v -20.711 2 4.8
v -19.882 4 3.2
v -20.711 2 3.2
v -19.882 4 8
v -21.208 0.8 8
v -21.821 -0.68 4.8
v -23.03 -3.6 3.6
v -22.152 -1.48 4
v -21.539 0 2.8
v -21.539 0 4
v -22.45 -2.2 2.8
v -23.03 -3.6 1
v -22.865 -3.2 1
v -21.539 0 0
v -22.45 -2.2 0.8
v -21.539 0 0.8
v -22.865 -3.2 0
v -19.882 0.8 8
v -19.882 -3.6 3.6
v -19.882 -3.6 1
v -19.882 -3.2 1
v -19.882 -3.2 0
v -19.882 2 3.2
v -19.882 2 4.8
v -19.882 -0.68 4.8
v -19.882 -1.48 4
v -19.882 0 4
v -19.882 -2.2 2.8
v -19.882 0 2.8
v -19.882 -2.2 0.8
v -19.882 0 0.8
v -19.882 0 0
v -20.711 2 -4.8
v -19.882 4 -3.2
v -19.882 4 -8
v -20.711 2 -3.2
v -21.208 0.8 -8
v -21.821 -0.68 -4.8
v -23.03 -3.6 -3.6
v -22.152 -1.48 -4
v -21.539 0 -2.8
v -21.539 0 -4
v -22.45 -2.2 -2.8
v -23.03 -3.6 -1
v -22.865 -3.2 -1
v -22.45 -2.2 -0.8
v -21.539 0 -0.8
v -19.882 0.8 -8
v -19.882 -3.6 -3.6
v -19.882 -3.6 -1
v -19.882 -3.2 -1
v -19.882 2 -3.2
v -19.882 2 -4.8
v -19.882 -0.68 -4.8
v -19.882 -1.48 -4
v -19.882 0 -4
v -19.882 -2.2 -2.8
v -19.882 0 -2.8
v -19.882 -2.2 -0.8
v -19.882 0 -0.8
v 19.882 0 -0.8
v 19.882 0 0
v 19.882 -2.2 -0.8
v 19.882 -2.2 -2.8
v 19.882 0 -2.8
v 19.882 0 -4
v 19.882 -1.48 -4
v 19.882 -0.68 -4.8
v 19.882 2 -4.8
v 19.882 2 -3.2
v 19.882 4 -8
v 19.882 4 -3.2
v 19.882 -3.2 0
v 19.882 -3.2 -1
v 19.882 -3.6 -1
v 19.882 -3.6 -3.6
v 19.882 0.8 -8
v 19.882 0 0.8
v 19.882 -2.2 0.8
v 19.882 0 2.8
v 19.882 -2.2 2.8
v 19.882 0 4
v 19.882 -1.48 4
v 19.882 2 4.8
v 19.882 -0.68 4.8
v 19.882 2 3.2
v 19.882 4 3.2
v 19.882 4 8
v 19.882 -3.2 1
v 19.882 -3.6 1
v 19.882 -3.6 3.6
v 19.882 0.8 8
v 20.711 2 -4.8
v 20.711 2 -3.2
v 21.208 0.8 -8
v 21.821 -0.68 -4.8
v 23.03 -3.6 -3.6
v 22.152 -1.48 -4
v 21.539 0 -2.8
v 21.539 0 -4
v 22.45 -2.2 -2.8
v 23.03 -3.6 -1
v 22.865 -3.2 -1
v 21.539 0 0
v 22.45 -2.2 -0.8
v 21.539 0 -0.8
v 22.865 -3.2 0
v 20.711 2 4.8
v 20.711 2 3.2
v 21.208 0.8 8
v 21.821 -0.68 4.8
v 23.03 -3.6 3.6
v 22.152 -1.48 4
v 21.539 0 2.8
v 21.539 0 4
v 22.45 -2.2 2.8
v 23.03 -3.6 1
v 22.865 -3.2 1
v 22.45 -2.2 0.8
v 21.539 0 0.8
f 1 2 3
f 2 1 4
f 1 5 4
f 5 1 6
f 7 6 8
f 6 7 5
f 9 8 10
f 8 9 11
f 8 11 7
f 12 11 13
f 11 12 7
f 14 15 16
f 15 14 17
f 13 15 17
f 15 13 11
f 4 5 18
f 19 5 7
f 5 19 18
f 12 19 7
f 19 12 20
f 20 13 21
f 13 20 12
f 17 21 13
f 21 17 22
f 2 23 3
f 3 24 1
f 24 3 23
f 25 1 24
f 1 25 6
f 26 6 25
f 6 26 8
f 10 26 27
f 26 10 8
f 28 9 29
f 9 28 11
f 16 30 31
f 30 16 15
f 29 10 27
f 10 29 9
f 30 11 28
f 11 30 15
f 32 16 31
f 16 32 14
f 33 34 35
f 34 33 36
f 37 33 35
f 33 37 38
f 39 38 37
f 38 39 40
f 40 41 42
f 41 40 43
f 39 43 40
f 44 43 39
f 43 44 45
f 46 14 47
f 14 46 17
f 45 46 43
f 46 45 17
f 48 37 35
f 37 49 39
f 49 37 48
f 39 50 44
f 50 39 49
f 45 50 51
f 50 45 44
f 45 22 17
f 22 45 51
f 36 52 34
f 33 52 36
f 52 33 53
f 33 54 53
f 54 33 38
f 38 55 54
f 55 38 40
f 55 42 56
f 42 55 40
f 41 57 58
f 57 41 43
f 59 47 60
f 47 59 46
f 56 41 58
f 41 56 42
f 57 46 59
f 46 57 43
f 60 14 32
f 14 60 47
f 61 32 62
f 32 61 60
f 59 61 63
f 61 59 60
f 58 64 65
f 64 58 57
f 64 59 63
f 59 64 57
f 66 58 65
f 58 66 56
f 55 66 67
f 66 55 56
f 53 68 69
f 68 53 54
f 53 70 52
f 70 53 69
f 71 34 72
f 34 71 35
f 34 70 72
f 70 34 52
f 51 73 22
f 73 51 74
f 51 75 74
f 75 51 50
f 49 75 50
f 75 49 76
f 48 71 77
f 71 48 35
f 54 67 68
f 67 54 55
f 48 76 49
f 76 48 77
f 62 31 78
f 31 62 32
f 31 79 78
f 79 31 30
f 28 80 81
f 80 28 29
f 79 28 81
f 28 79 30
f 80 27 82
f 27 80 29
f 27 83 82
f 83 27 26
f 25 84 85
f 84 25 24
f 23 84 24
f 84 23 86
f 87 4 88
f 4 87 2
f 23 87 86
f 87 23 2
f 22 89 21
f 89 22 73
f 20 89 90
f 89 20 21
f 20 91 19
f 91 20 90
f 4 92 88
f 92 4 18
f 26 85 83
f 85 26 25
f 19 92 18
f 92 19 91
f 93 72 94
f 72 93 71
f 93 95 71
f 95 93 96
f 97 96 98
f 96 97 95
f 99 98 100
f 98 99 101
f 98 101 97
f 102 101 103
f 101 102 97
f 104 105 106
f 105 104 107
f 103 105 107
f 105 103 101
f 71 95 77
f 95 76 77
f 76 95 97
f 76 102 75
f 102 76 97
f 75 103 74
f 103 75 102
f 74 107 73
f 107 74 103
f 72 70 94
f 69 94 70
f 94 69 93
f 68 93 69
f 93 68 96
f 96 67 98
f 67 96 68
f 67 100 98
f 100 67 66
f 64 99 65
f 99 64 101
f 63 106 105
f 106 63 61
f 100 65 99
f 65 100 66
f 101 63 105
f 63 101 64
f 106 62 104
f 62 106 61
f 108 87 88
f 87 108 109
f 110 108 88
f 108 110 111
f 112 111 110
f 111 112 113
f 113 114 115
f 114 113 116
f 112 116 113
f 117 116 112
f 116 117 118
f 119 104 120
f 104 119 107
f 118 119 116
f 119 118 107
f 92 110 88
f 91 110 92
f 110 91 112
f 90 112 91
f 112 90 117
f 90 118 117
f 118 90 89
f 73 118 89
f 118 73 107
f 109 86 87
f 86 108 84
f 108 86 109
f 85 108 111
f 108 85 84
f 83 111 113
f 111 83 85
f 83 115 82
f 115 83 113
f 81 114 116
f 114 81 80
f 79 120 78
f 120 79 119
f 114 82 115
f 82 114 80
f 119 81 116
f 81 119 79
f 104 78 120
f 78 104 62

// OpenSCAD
// file: ../p/rect2p.scad
use <../lib.scad>
function ldraw_lib__rect2p() = [
// 0 Rectangle with 2 Parallel Edges
// 0 Name: rect2p.dat
// 0 Author: Donald Sutter [technog]
// 0 !LDRAW_ORG Primitive UPDATE 2010-01
// 0 !LICENSE Licensed under CC BY 2.0 and CC BY 4.0 : see CAreadme.txt
// 
// 0 BFC CERTIFY CCW
  [0,"BFC","CERTIFY"],
  [0,"BFC","CCW"],
// 
// 0 !HISTORY 2003-08-01 [PTadmin] Official Update 2003-02
// 0 !HISTORY 2007-06-24 [PTadmin] Header formatted for Contributor Agreement
// 0 !HISTORY 2008-07-01 [PTadmin] Official Update 2008-01
// 0 !HISTORY 2010-01-17 [mikeheide] changed winding to CCW
// 0 !HISTORY 2010-04-05 [PTadmin] Official Update 2010-01
// 
// 
// 2 24 1 0 1 -1 0 1
  [2,24,1,0,1,-1,0,1],
// 2 24 -1 0 -1 1 0 -1
  [2,24,-1,0,-1,1,0,-1],
// 4 16 -1 0 1 -1 0 -1 1 0 -1 1 0 1
  [4,16,-1,0,1,-1,0,-1,1,0,-1,1,0,1],
// 0
];
module ldraw_lib__rect2p(step=0, col=false, unit=2/5, alt=false, line=0.2, solid=!$preview)
    makepoly(ldraw_lib__rect2p(), step=step, col=col, unit=unit, alt=alt, line=line, solid=solid);
ldraw_lib__rect2p(line=0.2);
// file: ../p/rect1.scad
use <../lib.scad>
function ldraw_lib__rect1() = [
// 0 Rectangle with 1 Edge
// 0 Name: rect1.dat
// 0 Author: Chris Dee [cwdee]
// 0 !LDRAW_ORG Primitive UPDATE 2010-01
// 0 !LICENSE Licensed under CC BY 2.0 and CC BY 4.0 : see CAreadme.txt
// 
// 0 BFC CERTIFY CCW
  [0,"BFC","CERTIFY"],
  [0,"BFC","CCW"],
// 
// 0 !HISTORY 2003-12-19 [PTadmin] Official Update 2003-03
// 0 !HISTORY 2007-06-24 [PTadmin] Header formatted for Contributor Agreement
// 0 !HISTORY 2008-07-01 [PTadmin] Official Update 2008-01
// 0 !HISTORY 2010-01-17 [mikeheide] changed winding to CCW
// 0 !HISTORY 2010-04-05 [PTadmin] Official Update 2010-01
// 
// 
// 2 24 1 0 -1 1 0 1
  [2,24,1,0,-1,1,0,1],
// 4 16 -1 0 1 -1 0 -1 1 0 -1 1 0 1
  [4,16,-1,0,1,-1,0,-1,1,0,-1,1,0,1],
// 0
];
module ldraw_lib__rect1(step=0, col=false, unit=2/5, alt=false, line=0.2, solid=!$preview)
    makepoly(ldraw_lib__rect1(), step=step, col=col, unit=unit, alt=alt, line=line, solid=solid);
ldraw_lib__rect1(line=0.2);
// file: ../p/box2-9p.scad
use <../lib.scad>
function ldraw_lib__box2_9p() = [
// 0 Box with 2 Faces with 3 Parallel Edges
// 0 Name: box2-9p.dat
// 0 Author: Ronald Vallenduuk [Duq]
// 0 !LDRAW_ORG Primitive UPDATE 2013-02
// 0 !LICENSE Licensed under CC BY 2.0 and CC BY 4.0 : see CAreadme.txt
// 
// 0 BFC CERTIFY CCW
  [0,"BFC","CERTIFY"],
  [0,"BFC","CCW"],
// 
// 0 !HISTORY 2013-12-23 [PTadmin] Official Update 2013-02
// 
// 
// 2 24 1 1 1 -1 1 1
  [2,24,1,1,1,-1,1,1],
// 2 24 1 -1 1 -1 -1 1
  [2,24,1,-1,1,-1,-1,1],
// 2 24 1 1 -1 -1 1 -1
  [2,24,1,1,-1,-1,1,-1],
// 4 16 1 1 1 1 1 -1 -1 1 -1 -1 1 1
  [4,16,1,1,1,1,1,-1,-1,1,-1,-1,1,1],
// 4 16 1 1 1 -1 1 1 -1 -1 1 1 -1 1
  [4,16,1,1,1,-1,1,1,-1,-1,1,1,-1,1],
];
module ldraw_lib__box2_9p(step=0, col=false, unit=2/5, alt=false, line=0.2, solid=!$preview)
    makepoly(ldraw_lib__box2_9p(), step=step, col=col, unit=unit, alt=alt, line=line, solid=solid);
ldraw_lib__box2_9p(line=0.2);
// file: ../p/box2-11.scad
use <../lib.scad>
function ldraw_lib__box2_11() = [
// 0 Box with 2 Faces without 11 Edges
// 0 Name: box2-11.dat
// 0 Author: Steffen [Steffen]
// 0 !LDRAW_ORG Primitive UPDATE 2005-01
// 0 !LICENSE Licensed under CC BY 2.0 and CC BY 4.0 : see CAreadme.txt
// 
// 0 BFC CERTIFY CCW
  [0,"BFC","CERTIFY"],
  [0,"BFC","CCW"],
// 
// 0 !HISTORY 2005-12-28 [PTadmin] Official Update 2005-01
// 0 !HISTORY 2007-06-24 [PTadmin] Header formatted for Contributor Agreement
// 0 !HISTORY 2008-07-01 [PTadmin] Official Update 2008-01
// 
// 
// 2 24 1 1 1 -1 1 1
  [2,24,1,1,1,-1,1,1],
// 4 16 1 1 1 1 1 -1 -1 1 -1 -1 1 1
  [4,16,1,1,1,1,1,-1,-1,1,-1,-1,1,1],
// 4 16 1 1 1 -1 1 1 -1 -1 1 1 -1 1
  [4,16,1,1,1,-1,1,1,-1,-1,1,1,-1,1],
// 0
];
module ldraw_lib__box2_11(step=0, col=false, unit=2/5, alt=false, line=0.2, solid=!$preview)
    makepoly(ldraw_lib__box2_11(), step=step, col=col, unit=unit, alt=alt, line=line, solid=solid);
ldraw_lib__box2_11(line=0.2);
// file: ../p/rect3.scad
use <../lib.scad>
function ldraw_lib__rect3() = [
// 0 Rectangle with 3 Edges
// 0 Name: rect3.dat
// 0 Author: Mark Kennedy [mkennedy]
// 0 !LDRAW_ORG Primitive UPDATE 2010-01
// 0 !LICENSE Licensed under CC BY 2.0 and CC BY 4.0 : see CAreadme.txt
// 
// 0 BFC CERTIFY CCW
  [0,"BFC","CERTIFY"],
  [0,"BFC","CCW"],
// 
// 0 !HISTORY 2003-08-01 [PTadmin] Official Update 2003-02
// 0 !HISTORY 2007-06-24 [PTadmin] Header formatted for Contributor Agreement
// 0 !HISTORY 2008-07-01 [PTadmin] Official Update 2008-01
// 0 !HISTORY 2010-01-17 [mikeheide] Change winding to CCW
// 0 !HISTORY 2010-04-05 [PTadmin] Official Update 2010-01
// 
// 
// 2 24 1 0 1 -1 0 1
  [2,24,1,0,1,-1,0,1],
// 2 24 1 0 1 1 0 -1
  [2,24,1,0,1,1,0,-1],
// 2 24 -1 0 1 -1 0 -1
  [2,24,-1,0,1,-1,0,-1],
// 4 16 -1 0 1 -1 0 -1 1 0 -1 1 0 1
  [4,16,-1,0,1,-1,0,-1,1,0,-1,1,0,1],
// 0 //
];
module ldraw_lib__rect3(step=0, col=false, unit=2/5, alt=false, line=0.2, solid=!$preview)
    makepoly(ldraw_lib__rect3(), step=step, col=col, unit=unit, alt=alt, line=line, solid=solid);
ldraw_lib__rect3(line=0.2);
// file: ../p/rect2a.scad
use <../lib.scad>
function ldraw_lib__rect2a() = [
// 0 Rectangle with 2 Adjacent Edges
// 0 Name: rect2a.dat
// 0 Author: Chris Dee [cwdee]
// 0 !LDRAW_ORG Primitive UPDATE 2010-01
// 0 !LICENSE Licensed under CC BY 2.0 and CC BY 4.0 : see CAreadme.txt
// 
// 0 BFC CERTIFY CCW
  [0,"BFC","CERTIFY"],
  [0,"BFC","CCW"],
// 
// 0 !HISTORY 2003-12-19 [PTadmin] Official Update 2003-03
// 0 !HISTORY 2007-06-24 [PTadmin] Header formatted for Contributor Agreement
// 0 !HISTORY 2008-07-01 [PTadmin] Official Update 2008-01
// 0 !HISTORY 2010-01-17 [mikeheide] changed winding to CCW
// 0 !HISTORY 2010-04-05 [PTadmin] Official Update 2010-01
// 
// 
// 2 24 1 0 1 -1 0 1
  [2,24,1,0,1,-1,0,1],
// 2 24 1 0 -1 1 0 1
  [2,24,1,0,-1,1,0,1],
// 4 16 -1 0 1 -1 0 -1 1 0 -1 1 0 1
  [4,16,-1,0,1,-1,0,-1,1,0,-1,1,0,1],
// 0
];
module ldraw_lib__rect2a(step=0, col=false, unit=2/5, alt=false, line=0.2, solid=!$preview)
    makepoly(ldraw_lib__rect2a(), step=step, col=col, unit=unit, alt=alt, line=line, solid=solid);
ldraw_lib__rect2a(line=0.2);
// file: s/48202s02.scad
use <../../lib.scad>
use <../../p/box2-11.scad>
use <../../p/box2-9p.scad>
use <../../p/rect1.scad>
use <../../p/rect2p.scad>
function ldraw_lib__s__48202s02() = [
// 0 ~Technic Bumper Section
// 0 Name: s\48202s02.dat
// 0 Author: Marc Giraudet [Mad_Marc]
// 0 !LDRAW_ORG Subpart UPDATE 2020-01
// 0 !LICENSE Licensed under CC BY 2.0 and CC BY 4.0 : see CAreadme.txt
// 
// 0 BFC CERTIFY CCW
  [0,"BFC","CERTIFY"],
  [0,"BFC","CCW"],
// 
// 0 !HISTORY 2020-06-28 [PTadmin] Official Update 2020-01
// 
// 
// 1 16 1 -1 -2.75 1 0 0 0 0 -1 0 2.75 0 box2-11.dat
  [1,16,1,-1,-2.75,1,0,0,0,0,-1,0,2.75,0, ldraw_lib__box2_11()],
// 0 BFC INVERTNEXT
  [0,"BFC","INVERTNEXT"],
// 1 16 1 -4.5 -2.75 1 0 0 0 -2.5 0 0 0 -2.75 box2-9p.dat
  [1,16,1,-4.5,-2.75,1,0,0,0,-2.5,0,0,0,-2.75, ldraw_lib__box2_9p()],
// 1 16 1 -8.5 -1.85 1 0 0 0 0 -1.5 0 1.85 0 box2-11.dat
  [1,16,1,-8.5,-1.85,1,0,0,0,0,-1.5,0,1.85,0, ldraw_lib__box2_11()],
// 0 BFC INVERTNEXT
  [0,"BFC","INVERTNEXT"],
// 1 16 1 -10 1.65 -1 0 0 0 -2 0 0 0 3.35 box2-9p.dat
  [1,16,1,-10,1.65,-1,0,0,0,-2,0,0,0,3.35, ldraw_lib__box2_9p()],
// 1 16 1 -14 7.5 -1 0 0 0 0 6 0 2.5 0 box2-11.dat
  [1,16,1,-14,7.5,-1,0,0,0,0,6,0,2.5,0, ldraw_lib__box2_11()],
// 0 BFC INVERTNEXT
  [0,"BFC","INVERTNEXT"],
// 1 16 1 -1.25 -8.5 1 0 0 0 0 -1.25 0 0.5 0 box2-11.dat
  [1,16,1,-1.25,-8.5,1,0,0,0,0,-1.25,0,0.5,0, ldraw_lib__box2_11()],
// 1 16 1 -5.75 -9 1 0 0 0 0 -3.25 0 1 0 rect2p.dat
  [1,16,1,-5.75,-9,1,0,0,0,0,-3.25,0,1,0, ldraw_lib__rect2p()],
// 1 16 1 -20 6 1 0 0 0 1 0 0 0 4 rect2p.dat
  [1,16,1,-20,6,1,0,0,0,1,0,0,0,4, ldraw_lib__rect2p()],
// 1 16 1 -11 -2.7 0 0 -1 0.9998 -0.7071 0 -0.9998 -0.7071 0 rect1.dat
  [1,16,1,-11,-2.7,0,0,-1,0.9998,-0.7071,0,-0.9998,-0.7071,0, ldraw_lib__rect1()],
// 4 16 0 -20 2 0 -9 -9 2 -9 -9 2 -20 2
  [4,16,0,-20,2,0,-9,-9,2,-9,-9,2,-20,2],
];
module ldraw_lib__s__48202s02(step=0, col=false, unit=2/5, alt=false, line=0.2, solid=!$preview)
    makepoly(ldraw_lib__s__48202s02(), step=step, col=col, unit=unit, alt=alt, line=line, solid=solid);
ldraw_lib__s__48202s02(line=0.2);
// file: s/48202s01.scad
use <../../lib.scad>
use <../../p/rect2a.scad>
use <../../p/rect3.scad>
function ldraw_lib__s__48202s01() = [
// 0 ~Technic Bumper End
// 0 Name: s\48202s01.dat
// 0 Author: Marc Giraudet [Mad_Marc]
// 0 !LDRAW_ORG Subpart UPDATE 2020-01
// 0 !LICENSE Licensed under CC BY 2.0 and CC BY 4.0 : see CAreadme.txt
// 
// 0 BFC CERTIFY CCW
  [0,"BFC","CERTIFY"],
  [0,"BFC","CCW"],
// 
// 0 !HISTORY 2020-06-28 [PTadmin] Official Update 2020-01
// 
// 
// 4 16 0 -20 10 0 -8 10 -2.071 -8 5 -2.071 -12 5
  [4,16,0,-20,10,0,-8,10,-2.071,-8,5,-2.071,-12,5],
// 4 16 -2.071 -12 5 -4.846 -12 -1.7 -3.314 -20 2 0 -20 10
  [4,16,-2.071,-12,5,-4.846,-12,-1.7,-3.314,-20,2,0,-20,10],
// 4 16 -3.314 -20 2 -4.846 -12 -1.7 -5.675 -10 -3.7 -7.87 -9 -9
  [4,16,-3.314,-20,2,-4.846,-12,-1.7,-5.675,-10,-3.7,-7.87,-9,-9],
// 4 16 -5.675 -10 -3.7 -4.142 -10 0 -4.142 -7 0 -6.42 -7 -5.5
  [4,16,-5.675,-10,-3.7,-4.142,-10,0,-4.142,-7,0,-6.42,-7,-5.5],
// 3 16 -5.675 -10 -3.7 -6.42 -7 -5.5 -7.87 -9 -9
  [3,16,-5.675,-10,-3.7,-6.42,-7,-5.5,-7.87,-9,-9],
// 4 16 -7.87 -9 -9 -6.42 -7 -5.5 -7.456 -2.5 -8 -7.87 -2.5 -9
  [4,16,-7.87,-9,-9,-6.42,-7,-5.5,-7.456,-2.5,-8,-7.87,-2.5,-9],
// 4 16 -4.142 -2 0 -4.142 0 0 -7.456 0 -8 -6.42 -2 -5.5
  [4,16,-4.142,-2,0,-4.142,0,0,-7.456,0,-8,-6.42,-2,-5.5],
// 4 16 -6.42 -7 -5.5 -6.42 -2 -5.5 -7.456 0 -8 -7.456 -2.5 -8
  [4,16,-6.42,-7,-5.5,-6.42,-2,-5.5,-7.456,0,-8,-7.456,-2.5,-8],
// 2 24 0 -20 10 -3.314 -20 2
  [2,24,0,-20,10,-3.314,-20,2],
// 2 24 -3.314 -20 2 -7.87 -9 -9
  [2,24,-3.314,-20,2,-7.87,-9,-9],
// 2 24 -7.87 -2.5 -9 -7.456 -2.5 -8
  [2,24,-7.87,-2.5,-9,-7.456,-2.5,-8],
// 2 24 -4.142 -2 0 -6.42 -2 -5.5
  [2,24,-4.142,-2,0,-6.42,-2,-5.5],
// 2 24 -6.42 -7 -5.5 -4.142 -7 0
  [2,24,-6.42,-7,-5.5,-4.142,-7,0],
// 2 24 -4.142 -10 0 -5.675 -10 -3.7
  [2,24,-4.142,-10,0,-5.675,-10,-3.7],
// 2 24 -5.675 -10 -3.7 -4.846 -12 -1.7
  [2,24,-5.675,-10,-3.7,-4.846,-12,-1.7],
// 2 24 -4.846 -12 -1.7 -2.071 -12 5
  [2,24,-4.846,-12,-1.7,-2.071,-12,5],
// 2 24 0 -8 10 -2.071 -8 5
  [2,24,0,-8,10,-2.071,-8,5],
// 2 24 0 -8 10 0 -20 10
  [2,24,0,-8,10,0,-20,10],
// 3 16 0 -20 10 -3.314 -20 2 0 -20 2
  [3,16,0,-20,10,-3.314,-20,2,0,-20,2],
// 4 16 0 -20 2 -3.314 -20 2 -7.87 -9 -9 0 -9 -9
  [4,16,0,-20,2,-3.314,-20,2,-7.87,-9,-9,0,-9,-9],
// 2 24 -3.314 -20 2 0 -20 2
  [2,24,-3.314,-20,2,0,-20,2],
// 1 16 -3.935 -5.75 -9 0 0 -3.935 -3.25 0 0 0 1 0 rect3.dat
  [1,16,-3.935,-5.75,-9,0,0,-3.935,-3.25,0,0,0,1,0, ldraw_lib__rect3()],
// 4 16 -7.456 -2.5 -8 0 -2.5 -8 0 -2.5 -9 -7.87 -2.5 -9
  [4,16,-7.456,-2.5,-8,0,-2.5,-8,0,-2.5,-9,-7.87,-2.5,-9],
// 1 16 -3.728 -1.25 -8 0 0 -3.728 -1.25 0 0 0 1 0 rect2a.dat
  [1,16,-3.728,-1.25,-8,0,0,-3.728,-1.25,0,0,0,1,0, ldraw_lib__rect2a()],
// 3 16 0 -8 10 0 -8 5 -2.071 -8 5
  [3,16,0,-8,10,0,-8,5,-2.071,-8,5],
// 1 16 -1.036 -10 5 0 0 -1.036 -2 0 0 0 1 0 rect3.dat
  [1,16,-1.036,-10,5,0,0,-1.036,-2,0,0,0,1,0, ldraw_lib__rect3()],
// 4 16 -2.071 -12 5 0 -12 5 0 -12 -1.7 -4.846 -12 -1.7
  [4,16,-2.071,-12,5,0,-12,5,0,-12,-1.7,-4.846,-12,-1.7],
// 4 16 -4.846 -12 -1.7 0 -12 -1.7 0 -10 -3.7 -5.675 -10 -3.7
  [4,16,-4.846,-12,-1.7,0,-12,-1.7,0,-10,-3.7,-5.675,-10,-3.7],
// 4 16 -5.675 -10 -3.7 0 -10 -3.7 0 -10 0 -4.142 -10 0
  [4,16,-5.675,-10,-3.7,0,-10,-3.7,0,-10,0,-4.142,-10,0],
// 4 16 -4.142 -7 0 0 -7 0 0 -7 -5.5 -6.42 -7 -5.5
  [4,16,-4.142,-7,0,0,-7,0,0,-7,-5.5,-6.42,-7,-5.5],
// 4 16 -6.42 -2 -5.5 0 -2 -5.5 0 -2 0 -4.142 -2 0
  [4,16,-6.42,-2,-5.5,0,-2,-5.5,0,-2,0,-4.142,-2,0],
// 1 16 -2.071 -8.5 0 0 0 -2.071 1.5 0 0 0 -1 0 rect3.dat
  [1,16,-2.071,-8.5,0,0,0,-2.071,1.5,0,0,0,-1,0, ldraw_lib__rect3()],
// 1 16 -3.21 -4.5 -5.5 0 0 -3.21 2.5 0 0 0 -1 0 rect3.dat
  [1,16,-3.21,-4.5,-5.5,0,0,-3.21,2.5,0,0,0,-1,0, ldraw_lib__rect3()],
// 1 16 -2.071 -1 0 -2.071 0 0 0 0 -1 0 -1 0 rect2a.dat
  [1,16,-2.071,-1,0,-2.071,0,0,0,0,-1,0,-1,0, ldraw_lib__rect2a()],
// 2 24 -4.846 -12 -1.7 0 -12 -1.7
  [2,24,-4.846,-12,-1.7,0,-12,-1.7],
// 2 24 -5.675 -10 -3.7 0 -10 -3.7
  [2,24,-5.675,-10,-3.7,0,-10,-3.7],
];
module ldraw_lib__s__48202s01(step=0, col=false, unit=2/5, alt=false, line=0.2, solid=!$preview)
    makepoly(ldraw_lib__s__48202s01(), step=step, col=col, unit=unit, alt=alt, line=line, solid=solid);
ldraw_lib__s__48202s01(line=0.2);
// main file
use <../lib.scad>
use <s/48202s01.scad>
use <s/48202s02.scad>
function ldraw_lib__48203() = [
// 0 Technic Bumper  2 x  6
// 0 Name: 48203.dat
// 0 Author: Marc Giraudet [Mad_Marc]
// 0 !LDRAW_ORG Part UPDATE 2020-01
// 0 !LICENSE Licensed under CC BY 2.0 and CC BY 4.0 : see CAreadme.txt
// 
// 0 BFC CERTIFY CCW
  [0,"BFC","CERTIFY"],
  [0,"BFC","CCW"],
// 
// 0 !HISTORY 2020-06-28 [PTadmin] Official Update 2020-01
// 
// 
// 1 16 -49.706 0 0 1 0 0 0 1 0 0 0 1 s\48202s01.dat
  [1,16,-49.706,0,0,1,0,0,0,1,0,0,0,1, ldraw_lib__s__48202s01()],
// 0 // INVERTNEXT
// 1 16 -49.706 0 0 1 0 0 0 -1 0 0 0 1 s\48202s01.dat
  [1,16,-49.706,0,0,1,0,0,0,-1,0,0,0,1, ldraw_lib__s__48202s01()],
// 1 16 -49.706 0 0 49.706 0 0 0 -1 0 0 0 1 s\48202s02.dat
  [1,16,-49.706,0,0,49.706,0,0,0,-1,0,0,0,1, ldraw_lib__s__48202s02()],
// 1 16 -49.706 0 0 49.706 0 0 0 1 0 0 0 1 s\48202s02.dat
  [1,16,-49.706,0,0,49.706,0,0,0,1,0,0,0,1, ldraw_lib__s__48202s02()],
// 1 16 49.706 0 0 -1 0 0 0 -1 0 0 0 1 s\48202s01.dat
  [1,16,49.706,0,0,-1,0,0,0,-1,0,0,0,1, ldraw_lib__s__48202s01()],
// 0 // INVERTNEXT
// 1 16 49.706 0 0 -1 0 0 0 1 0 0 0 1 s\48202s01.dat
  [1,16,49.706,0,0,-1,0,0,0,1,0,0,0,1, ldraw_lib__s__48202s01()],
];
module ldraw_lib__48203(step=0, col=false, unit=2/5, alt=false, line=0.2, solid=!$preview)
    makepoly(ldraw_lib__48203(), step=step, col=col, unit=unit, alt=alt, line=line, solid=solid);
ldraw_lib__48203(line=0.2);
